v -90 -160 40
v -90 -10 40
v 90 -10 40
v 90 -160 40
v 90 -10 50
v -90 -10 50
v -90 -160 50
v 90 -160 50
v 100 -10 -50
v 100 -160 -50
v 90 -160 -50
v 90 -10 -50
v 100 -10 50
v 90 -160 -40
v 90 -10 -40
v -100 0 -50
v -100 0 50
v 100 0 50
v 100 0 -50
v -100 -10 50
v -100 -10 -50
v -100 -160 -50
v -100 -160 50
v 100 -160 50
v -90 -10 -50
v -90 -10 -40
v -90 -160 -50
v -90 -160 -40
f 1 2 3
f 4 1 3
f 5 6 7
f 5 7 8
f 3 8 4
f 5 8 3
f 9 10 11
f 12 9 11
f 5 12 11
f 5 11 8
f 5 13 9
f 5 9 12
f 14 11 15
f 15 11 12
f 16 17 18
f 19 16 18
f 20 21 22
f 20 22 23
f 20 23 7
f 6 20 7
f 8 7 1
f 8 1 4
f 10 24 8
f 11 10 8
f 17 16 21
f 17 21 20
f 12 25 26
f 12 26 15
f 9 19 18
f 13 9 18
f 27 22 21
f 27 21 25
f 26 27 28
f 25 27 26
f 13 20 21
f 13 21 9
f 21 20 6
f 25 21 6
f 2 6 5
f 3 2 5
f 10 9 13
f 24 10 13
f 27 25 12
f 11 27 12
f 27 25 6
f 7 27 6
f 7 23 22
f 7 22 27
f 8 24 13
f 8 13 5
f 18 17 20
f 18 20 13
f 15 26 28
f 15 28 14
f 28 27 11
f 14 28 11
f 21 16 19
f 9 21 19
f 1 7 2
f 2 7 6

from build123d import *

# Parameters (mm, degrees)
F0_W     = 200
F0_H     = 100
F1_DEPTH = 10
F2_W     = 10
F2_H     = 100
F3_DEPTH = 150
F5_W     = 180
F5_H     = 150
F6_DEPTH = 10


with BuildPart() as f1:
    # F0 (on Front) → F1 (new body)
    with BuildSketch(Plane.XZ):
        Rectangle(F0_W, F0_H)
    extrude(amount=F1_DEPTH)


with BuildPart() as f3:
    # F2 (on face) → F3 (new body)
    with BuildSketch(Plane.XZ.offset(10)):
        with Locations((-95, 0)):
            Rectangle(F2_W, F2_H)
    extrude(amount=F3_DEPTH)


with BuildPart() as f4_1:
    # F4: instance of F3
    add(f3.part.mirror(Plane.YZ))


with BuildPart() as f6:
    # F5 (on face) → F6 (new body)
    with BuildSketch(Plane.XY.offset(50)):
        with Locations((0, -85)):
            Rectangle(F5_W, F5_H)
    extrude(amount=-F6_DEPTH)


with BuildPart() as f7_1:
    # F7: instance of F6
    add(f6.part.mirror(Plane.XY))


solid = Compound([f1.part, f3.part, f4_1.part, f6.part, f7_1.part])
